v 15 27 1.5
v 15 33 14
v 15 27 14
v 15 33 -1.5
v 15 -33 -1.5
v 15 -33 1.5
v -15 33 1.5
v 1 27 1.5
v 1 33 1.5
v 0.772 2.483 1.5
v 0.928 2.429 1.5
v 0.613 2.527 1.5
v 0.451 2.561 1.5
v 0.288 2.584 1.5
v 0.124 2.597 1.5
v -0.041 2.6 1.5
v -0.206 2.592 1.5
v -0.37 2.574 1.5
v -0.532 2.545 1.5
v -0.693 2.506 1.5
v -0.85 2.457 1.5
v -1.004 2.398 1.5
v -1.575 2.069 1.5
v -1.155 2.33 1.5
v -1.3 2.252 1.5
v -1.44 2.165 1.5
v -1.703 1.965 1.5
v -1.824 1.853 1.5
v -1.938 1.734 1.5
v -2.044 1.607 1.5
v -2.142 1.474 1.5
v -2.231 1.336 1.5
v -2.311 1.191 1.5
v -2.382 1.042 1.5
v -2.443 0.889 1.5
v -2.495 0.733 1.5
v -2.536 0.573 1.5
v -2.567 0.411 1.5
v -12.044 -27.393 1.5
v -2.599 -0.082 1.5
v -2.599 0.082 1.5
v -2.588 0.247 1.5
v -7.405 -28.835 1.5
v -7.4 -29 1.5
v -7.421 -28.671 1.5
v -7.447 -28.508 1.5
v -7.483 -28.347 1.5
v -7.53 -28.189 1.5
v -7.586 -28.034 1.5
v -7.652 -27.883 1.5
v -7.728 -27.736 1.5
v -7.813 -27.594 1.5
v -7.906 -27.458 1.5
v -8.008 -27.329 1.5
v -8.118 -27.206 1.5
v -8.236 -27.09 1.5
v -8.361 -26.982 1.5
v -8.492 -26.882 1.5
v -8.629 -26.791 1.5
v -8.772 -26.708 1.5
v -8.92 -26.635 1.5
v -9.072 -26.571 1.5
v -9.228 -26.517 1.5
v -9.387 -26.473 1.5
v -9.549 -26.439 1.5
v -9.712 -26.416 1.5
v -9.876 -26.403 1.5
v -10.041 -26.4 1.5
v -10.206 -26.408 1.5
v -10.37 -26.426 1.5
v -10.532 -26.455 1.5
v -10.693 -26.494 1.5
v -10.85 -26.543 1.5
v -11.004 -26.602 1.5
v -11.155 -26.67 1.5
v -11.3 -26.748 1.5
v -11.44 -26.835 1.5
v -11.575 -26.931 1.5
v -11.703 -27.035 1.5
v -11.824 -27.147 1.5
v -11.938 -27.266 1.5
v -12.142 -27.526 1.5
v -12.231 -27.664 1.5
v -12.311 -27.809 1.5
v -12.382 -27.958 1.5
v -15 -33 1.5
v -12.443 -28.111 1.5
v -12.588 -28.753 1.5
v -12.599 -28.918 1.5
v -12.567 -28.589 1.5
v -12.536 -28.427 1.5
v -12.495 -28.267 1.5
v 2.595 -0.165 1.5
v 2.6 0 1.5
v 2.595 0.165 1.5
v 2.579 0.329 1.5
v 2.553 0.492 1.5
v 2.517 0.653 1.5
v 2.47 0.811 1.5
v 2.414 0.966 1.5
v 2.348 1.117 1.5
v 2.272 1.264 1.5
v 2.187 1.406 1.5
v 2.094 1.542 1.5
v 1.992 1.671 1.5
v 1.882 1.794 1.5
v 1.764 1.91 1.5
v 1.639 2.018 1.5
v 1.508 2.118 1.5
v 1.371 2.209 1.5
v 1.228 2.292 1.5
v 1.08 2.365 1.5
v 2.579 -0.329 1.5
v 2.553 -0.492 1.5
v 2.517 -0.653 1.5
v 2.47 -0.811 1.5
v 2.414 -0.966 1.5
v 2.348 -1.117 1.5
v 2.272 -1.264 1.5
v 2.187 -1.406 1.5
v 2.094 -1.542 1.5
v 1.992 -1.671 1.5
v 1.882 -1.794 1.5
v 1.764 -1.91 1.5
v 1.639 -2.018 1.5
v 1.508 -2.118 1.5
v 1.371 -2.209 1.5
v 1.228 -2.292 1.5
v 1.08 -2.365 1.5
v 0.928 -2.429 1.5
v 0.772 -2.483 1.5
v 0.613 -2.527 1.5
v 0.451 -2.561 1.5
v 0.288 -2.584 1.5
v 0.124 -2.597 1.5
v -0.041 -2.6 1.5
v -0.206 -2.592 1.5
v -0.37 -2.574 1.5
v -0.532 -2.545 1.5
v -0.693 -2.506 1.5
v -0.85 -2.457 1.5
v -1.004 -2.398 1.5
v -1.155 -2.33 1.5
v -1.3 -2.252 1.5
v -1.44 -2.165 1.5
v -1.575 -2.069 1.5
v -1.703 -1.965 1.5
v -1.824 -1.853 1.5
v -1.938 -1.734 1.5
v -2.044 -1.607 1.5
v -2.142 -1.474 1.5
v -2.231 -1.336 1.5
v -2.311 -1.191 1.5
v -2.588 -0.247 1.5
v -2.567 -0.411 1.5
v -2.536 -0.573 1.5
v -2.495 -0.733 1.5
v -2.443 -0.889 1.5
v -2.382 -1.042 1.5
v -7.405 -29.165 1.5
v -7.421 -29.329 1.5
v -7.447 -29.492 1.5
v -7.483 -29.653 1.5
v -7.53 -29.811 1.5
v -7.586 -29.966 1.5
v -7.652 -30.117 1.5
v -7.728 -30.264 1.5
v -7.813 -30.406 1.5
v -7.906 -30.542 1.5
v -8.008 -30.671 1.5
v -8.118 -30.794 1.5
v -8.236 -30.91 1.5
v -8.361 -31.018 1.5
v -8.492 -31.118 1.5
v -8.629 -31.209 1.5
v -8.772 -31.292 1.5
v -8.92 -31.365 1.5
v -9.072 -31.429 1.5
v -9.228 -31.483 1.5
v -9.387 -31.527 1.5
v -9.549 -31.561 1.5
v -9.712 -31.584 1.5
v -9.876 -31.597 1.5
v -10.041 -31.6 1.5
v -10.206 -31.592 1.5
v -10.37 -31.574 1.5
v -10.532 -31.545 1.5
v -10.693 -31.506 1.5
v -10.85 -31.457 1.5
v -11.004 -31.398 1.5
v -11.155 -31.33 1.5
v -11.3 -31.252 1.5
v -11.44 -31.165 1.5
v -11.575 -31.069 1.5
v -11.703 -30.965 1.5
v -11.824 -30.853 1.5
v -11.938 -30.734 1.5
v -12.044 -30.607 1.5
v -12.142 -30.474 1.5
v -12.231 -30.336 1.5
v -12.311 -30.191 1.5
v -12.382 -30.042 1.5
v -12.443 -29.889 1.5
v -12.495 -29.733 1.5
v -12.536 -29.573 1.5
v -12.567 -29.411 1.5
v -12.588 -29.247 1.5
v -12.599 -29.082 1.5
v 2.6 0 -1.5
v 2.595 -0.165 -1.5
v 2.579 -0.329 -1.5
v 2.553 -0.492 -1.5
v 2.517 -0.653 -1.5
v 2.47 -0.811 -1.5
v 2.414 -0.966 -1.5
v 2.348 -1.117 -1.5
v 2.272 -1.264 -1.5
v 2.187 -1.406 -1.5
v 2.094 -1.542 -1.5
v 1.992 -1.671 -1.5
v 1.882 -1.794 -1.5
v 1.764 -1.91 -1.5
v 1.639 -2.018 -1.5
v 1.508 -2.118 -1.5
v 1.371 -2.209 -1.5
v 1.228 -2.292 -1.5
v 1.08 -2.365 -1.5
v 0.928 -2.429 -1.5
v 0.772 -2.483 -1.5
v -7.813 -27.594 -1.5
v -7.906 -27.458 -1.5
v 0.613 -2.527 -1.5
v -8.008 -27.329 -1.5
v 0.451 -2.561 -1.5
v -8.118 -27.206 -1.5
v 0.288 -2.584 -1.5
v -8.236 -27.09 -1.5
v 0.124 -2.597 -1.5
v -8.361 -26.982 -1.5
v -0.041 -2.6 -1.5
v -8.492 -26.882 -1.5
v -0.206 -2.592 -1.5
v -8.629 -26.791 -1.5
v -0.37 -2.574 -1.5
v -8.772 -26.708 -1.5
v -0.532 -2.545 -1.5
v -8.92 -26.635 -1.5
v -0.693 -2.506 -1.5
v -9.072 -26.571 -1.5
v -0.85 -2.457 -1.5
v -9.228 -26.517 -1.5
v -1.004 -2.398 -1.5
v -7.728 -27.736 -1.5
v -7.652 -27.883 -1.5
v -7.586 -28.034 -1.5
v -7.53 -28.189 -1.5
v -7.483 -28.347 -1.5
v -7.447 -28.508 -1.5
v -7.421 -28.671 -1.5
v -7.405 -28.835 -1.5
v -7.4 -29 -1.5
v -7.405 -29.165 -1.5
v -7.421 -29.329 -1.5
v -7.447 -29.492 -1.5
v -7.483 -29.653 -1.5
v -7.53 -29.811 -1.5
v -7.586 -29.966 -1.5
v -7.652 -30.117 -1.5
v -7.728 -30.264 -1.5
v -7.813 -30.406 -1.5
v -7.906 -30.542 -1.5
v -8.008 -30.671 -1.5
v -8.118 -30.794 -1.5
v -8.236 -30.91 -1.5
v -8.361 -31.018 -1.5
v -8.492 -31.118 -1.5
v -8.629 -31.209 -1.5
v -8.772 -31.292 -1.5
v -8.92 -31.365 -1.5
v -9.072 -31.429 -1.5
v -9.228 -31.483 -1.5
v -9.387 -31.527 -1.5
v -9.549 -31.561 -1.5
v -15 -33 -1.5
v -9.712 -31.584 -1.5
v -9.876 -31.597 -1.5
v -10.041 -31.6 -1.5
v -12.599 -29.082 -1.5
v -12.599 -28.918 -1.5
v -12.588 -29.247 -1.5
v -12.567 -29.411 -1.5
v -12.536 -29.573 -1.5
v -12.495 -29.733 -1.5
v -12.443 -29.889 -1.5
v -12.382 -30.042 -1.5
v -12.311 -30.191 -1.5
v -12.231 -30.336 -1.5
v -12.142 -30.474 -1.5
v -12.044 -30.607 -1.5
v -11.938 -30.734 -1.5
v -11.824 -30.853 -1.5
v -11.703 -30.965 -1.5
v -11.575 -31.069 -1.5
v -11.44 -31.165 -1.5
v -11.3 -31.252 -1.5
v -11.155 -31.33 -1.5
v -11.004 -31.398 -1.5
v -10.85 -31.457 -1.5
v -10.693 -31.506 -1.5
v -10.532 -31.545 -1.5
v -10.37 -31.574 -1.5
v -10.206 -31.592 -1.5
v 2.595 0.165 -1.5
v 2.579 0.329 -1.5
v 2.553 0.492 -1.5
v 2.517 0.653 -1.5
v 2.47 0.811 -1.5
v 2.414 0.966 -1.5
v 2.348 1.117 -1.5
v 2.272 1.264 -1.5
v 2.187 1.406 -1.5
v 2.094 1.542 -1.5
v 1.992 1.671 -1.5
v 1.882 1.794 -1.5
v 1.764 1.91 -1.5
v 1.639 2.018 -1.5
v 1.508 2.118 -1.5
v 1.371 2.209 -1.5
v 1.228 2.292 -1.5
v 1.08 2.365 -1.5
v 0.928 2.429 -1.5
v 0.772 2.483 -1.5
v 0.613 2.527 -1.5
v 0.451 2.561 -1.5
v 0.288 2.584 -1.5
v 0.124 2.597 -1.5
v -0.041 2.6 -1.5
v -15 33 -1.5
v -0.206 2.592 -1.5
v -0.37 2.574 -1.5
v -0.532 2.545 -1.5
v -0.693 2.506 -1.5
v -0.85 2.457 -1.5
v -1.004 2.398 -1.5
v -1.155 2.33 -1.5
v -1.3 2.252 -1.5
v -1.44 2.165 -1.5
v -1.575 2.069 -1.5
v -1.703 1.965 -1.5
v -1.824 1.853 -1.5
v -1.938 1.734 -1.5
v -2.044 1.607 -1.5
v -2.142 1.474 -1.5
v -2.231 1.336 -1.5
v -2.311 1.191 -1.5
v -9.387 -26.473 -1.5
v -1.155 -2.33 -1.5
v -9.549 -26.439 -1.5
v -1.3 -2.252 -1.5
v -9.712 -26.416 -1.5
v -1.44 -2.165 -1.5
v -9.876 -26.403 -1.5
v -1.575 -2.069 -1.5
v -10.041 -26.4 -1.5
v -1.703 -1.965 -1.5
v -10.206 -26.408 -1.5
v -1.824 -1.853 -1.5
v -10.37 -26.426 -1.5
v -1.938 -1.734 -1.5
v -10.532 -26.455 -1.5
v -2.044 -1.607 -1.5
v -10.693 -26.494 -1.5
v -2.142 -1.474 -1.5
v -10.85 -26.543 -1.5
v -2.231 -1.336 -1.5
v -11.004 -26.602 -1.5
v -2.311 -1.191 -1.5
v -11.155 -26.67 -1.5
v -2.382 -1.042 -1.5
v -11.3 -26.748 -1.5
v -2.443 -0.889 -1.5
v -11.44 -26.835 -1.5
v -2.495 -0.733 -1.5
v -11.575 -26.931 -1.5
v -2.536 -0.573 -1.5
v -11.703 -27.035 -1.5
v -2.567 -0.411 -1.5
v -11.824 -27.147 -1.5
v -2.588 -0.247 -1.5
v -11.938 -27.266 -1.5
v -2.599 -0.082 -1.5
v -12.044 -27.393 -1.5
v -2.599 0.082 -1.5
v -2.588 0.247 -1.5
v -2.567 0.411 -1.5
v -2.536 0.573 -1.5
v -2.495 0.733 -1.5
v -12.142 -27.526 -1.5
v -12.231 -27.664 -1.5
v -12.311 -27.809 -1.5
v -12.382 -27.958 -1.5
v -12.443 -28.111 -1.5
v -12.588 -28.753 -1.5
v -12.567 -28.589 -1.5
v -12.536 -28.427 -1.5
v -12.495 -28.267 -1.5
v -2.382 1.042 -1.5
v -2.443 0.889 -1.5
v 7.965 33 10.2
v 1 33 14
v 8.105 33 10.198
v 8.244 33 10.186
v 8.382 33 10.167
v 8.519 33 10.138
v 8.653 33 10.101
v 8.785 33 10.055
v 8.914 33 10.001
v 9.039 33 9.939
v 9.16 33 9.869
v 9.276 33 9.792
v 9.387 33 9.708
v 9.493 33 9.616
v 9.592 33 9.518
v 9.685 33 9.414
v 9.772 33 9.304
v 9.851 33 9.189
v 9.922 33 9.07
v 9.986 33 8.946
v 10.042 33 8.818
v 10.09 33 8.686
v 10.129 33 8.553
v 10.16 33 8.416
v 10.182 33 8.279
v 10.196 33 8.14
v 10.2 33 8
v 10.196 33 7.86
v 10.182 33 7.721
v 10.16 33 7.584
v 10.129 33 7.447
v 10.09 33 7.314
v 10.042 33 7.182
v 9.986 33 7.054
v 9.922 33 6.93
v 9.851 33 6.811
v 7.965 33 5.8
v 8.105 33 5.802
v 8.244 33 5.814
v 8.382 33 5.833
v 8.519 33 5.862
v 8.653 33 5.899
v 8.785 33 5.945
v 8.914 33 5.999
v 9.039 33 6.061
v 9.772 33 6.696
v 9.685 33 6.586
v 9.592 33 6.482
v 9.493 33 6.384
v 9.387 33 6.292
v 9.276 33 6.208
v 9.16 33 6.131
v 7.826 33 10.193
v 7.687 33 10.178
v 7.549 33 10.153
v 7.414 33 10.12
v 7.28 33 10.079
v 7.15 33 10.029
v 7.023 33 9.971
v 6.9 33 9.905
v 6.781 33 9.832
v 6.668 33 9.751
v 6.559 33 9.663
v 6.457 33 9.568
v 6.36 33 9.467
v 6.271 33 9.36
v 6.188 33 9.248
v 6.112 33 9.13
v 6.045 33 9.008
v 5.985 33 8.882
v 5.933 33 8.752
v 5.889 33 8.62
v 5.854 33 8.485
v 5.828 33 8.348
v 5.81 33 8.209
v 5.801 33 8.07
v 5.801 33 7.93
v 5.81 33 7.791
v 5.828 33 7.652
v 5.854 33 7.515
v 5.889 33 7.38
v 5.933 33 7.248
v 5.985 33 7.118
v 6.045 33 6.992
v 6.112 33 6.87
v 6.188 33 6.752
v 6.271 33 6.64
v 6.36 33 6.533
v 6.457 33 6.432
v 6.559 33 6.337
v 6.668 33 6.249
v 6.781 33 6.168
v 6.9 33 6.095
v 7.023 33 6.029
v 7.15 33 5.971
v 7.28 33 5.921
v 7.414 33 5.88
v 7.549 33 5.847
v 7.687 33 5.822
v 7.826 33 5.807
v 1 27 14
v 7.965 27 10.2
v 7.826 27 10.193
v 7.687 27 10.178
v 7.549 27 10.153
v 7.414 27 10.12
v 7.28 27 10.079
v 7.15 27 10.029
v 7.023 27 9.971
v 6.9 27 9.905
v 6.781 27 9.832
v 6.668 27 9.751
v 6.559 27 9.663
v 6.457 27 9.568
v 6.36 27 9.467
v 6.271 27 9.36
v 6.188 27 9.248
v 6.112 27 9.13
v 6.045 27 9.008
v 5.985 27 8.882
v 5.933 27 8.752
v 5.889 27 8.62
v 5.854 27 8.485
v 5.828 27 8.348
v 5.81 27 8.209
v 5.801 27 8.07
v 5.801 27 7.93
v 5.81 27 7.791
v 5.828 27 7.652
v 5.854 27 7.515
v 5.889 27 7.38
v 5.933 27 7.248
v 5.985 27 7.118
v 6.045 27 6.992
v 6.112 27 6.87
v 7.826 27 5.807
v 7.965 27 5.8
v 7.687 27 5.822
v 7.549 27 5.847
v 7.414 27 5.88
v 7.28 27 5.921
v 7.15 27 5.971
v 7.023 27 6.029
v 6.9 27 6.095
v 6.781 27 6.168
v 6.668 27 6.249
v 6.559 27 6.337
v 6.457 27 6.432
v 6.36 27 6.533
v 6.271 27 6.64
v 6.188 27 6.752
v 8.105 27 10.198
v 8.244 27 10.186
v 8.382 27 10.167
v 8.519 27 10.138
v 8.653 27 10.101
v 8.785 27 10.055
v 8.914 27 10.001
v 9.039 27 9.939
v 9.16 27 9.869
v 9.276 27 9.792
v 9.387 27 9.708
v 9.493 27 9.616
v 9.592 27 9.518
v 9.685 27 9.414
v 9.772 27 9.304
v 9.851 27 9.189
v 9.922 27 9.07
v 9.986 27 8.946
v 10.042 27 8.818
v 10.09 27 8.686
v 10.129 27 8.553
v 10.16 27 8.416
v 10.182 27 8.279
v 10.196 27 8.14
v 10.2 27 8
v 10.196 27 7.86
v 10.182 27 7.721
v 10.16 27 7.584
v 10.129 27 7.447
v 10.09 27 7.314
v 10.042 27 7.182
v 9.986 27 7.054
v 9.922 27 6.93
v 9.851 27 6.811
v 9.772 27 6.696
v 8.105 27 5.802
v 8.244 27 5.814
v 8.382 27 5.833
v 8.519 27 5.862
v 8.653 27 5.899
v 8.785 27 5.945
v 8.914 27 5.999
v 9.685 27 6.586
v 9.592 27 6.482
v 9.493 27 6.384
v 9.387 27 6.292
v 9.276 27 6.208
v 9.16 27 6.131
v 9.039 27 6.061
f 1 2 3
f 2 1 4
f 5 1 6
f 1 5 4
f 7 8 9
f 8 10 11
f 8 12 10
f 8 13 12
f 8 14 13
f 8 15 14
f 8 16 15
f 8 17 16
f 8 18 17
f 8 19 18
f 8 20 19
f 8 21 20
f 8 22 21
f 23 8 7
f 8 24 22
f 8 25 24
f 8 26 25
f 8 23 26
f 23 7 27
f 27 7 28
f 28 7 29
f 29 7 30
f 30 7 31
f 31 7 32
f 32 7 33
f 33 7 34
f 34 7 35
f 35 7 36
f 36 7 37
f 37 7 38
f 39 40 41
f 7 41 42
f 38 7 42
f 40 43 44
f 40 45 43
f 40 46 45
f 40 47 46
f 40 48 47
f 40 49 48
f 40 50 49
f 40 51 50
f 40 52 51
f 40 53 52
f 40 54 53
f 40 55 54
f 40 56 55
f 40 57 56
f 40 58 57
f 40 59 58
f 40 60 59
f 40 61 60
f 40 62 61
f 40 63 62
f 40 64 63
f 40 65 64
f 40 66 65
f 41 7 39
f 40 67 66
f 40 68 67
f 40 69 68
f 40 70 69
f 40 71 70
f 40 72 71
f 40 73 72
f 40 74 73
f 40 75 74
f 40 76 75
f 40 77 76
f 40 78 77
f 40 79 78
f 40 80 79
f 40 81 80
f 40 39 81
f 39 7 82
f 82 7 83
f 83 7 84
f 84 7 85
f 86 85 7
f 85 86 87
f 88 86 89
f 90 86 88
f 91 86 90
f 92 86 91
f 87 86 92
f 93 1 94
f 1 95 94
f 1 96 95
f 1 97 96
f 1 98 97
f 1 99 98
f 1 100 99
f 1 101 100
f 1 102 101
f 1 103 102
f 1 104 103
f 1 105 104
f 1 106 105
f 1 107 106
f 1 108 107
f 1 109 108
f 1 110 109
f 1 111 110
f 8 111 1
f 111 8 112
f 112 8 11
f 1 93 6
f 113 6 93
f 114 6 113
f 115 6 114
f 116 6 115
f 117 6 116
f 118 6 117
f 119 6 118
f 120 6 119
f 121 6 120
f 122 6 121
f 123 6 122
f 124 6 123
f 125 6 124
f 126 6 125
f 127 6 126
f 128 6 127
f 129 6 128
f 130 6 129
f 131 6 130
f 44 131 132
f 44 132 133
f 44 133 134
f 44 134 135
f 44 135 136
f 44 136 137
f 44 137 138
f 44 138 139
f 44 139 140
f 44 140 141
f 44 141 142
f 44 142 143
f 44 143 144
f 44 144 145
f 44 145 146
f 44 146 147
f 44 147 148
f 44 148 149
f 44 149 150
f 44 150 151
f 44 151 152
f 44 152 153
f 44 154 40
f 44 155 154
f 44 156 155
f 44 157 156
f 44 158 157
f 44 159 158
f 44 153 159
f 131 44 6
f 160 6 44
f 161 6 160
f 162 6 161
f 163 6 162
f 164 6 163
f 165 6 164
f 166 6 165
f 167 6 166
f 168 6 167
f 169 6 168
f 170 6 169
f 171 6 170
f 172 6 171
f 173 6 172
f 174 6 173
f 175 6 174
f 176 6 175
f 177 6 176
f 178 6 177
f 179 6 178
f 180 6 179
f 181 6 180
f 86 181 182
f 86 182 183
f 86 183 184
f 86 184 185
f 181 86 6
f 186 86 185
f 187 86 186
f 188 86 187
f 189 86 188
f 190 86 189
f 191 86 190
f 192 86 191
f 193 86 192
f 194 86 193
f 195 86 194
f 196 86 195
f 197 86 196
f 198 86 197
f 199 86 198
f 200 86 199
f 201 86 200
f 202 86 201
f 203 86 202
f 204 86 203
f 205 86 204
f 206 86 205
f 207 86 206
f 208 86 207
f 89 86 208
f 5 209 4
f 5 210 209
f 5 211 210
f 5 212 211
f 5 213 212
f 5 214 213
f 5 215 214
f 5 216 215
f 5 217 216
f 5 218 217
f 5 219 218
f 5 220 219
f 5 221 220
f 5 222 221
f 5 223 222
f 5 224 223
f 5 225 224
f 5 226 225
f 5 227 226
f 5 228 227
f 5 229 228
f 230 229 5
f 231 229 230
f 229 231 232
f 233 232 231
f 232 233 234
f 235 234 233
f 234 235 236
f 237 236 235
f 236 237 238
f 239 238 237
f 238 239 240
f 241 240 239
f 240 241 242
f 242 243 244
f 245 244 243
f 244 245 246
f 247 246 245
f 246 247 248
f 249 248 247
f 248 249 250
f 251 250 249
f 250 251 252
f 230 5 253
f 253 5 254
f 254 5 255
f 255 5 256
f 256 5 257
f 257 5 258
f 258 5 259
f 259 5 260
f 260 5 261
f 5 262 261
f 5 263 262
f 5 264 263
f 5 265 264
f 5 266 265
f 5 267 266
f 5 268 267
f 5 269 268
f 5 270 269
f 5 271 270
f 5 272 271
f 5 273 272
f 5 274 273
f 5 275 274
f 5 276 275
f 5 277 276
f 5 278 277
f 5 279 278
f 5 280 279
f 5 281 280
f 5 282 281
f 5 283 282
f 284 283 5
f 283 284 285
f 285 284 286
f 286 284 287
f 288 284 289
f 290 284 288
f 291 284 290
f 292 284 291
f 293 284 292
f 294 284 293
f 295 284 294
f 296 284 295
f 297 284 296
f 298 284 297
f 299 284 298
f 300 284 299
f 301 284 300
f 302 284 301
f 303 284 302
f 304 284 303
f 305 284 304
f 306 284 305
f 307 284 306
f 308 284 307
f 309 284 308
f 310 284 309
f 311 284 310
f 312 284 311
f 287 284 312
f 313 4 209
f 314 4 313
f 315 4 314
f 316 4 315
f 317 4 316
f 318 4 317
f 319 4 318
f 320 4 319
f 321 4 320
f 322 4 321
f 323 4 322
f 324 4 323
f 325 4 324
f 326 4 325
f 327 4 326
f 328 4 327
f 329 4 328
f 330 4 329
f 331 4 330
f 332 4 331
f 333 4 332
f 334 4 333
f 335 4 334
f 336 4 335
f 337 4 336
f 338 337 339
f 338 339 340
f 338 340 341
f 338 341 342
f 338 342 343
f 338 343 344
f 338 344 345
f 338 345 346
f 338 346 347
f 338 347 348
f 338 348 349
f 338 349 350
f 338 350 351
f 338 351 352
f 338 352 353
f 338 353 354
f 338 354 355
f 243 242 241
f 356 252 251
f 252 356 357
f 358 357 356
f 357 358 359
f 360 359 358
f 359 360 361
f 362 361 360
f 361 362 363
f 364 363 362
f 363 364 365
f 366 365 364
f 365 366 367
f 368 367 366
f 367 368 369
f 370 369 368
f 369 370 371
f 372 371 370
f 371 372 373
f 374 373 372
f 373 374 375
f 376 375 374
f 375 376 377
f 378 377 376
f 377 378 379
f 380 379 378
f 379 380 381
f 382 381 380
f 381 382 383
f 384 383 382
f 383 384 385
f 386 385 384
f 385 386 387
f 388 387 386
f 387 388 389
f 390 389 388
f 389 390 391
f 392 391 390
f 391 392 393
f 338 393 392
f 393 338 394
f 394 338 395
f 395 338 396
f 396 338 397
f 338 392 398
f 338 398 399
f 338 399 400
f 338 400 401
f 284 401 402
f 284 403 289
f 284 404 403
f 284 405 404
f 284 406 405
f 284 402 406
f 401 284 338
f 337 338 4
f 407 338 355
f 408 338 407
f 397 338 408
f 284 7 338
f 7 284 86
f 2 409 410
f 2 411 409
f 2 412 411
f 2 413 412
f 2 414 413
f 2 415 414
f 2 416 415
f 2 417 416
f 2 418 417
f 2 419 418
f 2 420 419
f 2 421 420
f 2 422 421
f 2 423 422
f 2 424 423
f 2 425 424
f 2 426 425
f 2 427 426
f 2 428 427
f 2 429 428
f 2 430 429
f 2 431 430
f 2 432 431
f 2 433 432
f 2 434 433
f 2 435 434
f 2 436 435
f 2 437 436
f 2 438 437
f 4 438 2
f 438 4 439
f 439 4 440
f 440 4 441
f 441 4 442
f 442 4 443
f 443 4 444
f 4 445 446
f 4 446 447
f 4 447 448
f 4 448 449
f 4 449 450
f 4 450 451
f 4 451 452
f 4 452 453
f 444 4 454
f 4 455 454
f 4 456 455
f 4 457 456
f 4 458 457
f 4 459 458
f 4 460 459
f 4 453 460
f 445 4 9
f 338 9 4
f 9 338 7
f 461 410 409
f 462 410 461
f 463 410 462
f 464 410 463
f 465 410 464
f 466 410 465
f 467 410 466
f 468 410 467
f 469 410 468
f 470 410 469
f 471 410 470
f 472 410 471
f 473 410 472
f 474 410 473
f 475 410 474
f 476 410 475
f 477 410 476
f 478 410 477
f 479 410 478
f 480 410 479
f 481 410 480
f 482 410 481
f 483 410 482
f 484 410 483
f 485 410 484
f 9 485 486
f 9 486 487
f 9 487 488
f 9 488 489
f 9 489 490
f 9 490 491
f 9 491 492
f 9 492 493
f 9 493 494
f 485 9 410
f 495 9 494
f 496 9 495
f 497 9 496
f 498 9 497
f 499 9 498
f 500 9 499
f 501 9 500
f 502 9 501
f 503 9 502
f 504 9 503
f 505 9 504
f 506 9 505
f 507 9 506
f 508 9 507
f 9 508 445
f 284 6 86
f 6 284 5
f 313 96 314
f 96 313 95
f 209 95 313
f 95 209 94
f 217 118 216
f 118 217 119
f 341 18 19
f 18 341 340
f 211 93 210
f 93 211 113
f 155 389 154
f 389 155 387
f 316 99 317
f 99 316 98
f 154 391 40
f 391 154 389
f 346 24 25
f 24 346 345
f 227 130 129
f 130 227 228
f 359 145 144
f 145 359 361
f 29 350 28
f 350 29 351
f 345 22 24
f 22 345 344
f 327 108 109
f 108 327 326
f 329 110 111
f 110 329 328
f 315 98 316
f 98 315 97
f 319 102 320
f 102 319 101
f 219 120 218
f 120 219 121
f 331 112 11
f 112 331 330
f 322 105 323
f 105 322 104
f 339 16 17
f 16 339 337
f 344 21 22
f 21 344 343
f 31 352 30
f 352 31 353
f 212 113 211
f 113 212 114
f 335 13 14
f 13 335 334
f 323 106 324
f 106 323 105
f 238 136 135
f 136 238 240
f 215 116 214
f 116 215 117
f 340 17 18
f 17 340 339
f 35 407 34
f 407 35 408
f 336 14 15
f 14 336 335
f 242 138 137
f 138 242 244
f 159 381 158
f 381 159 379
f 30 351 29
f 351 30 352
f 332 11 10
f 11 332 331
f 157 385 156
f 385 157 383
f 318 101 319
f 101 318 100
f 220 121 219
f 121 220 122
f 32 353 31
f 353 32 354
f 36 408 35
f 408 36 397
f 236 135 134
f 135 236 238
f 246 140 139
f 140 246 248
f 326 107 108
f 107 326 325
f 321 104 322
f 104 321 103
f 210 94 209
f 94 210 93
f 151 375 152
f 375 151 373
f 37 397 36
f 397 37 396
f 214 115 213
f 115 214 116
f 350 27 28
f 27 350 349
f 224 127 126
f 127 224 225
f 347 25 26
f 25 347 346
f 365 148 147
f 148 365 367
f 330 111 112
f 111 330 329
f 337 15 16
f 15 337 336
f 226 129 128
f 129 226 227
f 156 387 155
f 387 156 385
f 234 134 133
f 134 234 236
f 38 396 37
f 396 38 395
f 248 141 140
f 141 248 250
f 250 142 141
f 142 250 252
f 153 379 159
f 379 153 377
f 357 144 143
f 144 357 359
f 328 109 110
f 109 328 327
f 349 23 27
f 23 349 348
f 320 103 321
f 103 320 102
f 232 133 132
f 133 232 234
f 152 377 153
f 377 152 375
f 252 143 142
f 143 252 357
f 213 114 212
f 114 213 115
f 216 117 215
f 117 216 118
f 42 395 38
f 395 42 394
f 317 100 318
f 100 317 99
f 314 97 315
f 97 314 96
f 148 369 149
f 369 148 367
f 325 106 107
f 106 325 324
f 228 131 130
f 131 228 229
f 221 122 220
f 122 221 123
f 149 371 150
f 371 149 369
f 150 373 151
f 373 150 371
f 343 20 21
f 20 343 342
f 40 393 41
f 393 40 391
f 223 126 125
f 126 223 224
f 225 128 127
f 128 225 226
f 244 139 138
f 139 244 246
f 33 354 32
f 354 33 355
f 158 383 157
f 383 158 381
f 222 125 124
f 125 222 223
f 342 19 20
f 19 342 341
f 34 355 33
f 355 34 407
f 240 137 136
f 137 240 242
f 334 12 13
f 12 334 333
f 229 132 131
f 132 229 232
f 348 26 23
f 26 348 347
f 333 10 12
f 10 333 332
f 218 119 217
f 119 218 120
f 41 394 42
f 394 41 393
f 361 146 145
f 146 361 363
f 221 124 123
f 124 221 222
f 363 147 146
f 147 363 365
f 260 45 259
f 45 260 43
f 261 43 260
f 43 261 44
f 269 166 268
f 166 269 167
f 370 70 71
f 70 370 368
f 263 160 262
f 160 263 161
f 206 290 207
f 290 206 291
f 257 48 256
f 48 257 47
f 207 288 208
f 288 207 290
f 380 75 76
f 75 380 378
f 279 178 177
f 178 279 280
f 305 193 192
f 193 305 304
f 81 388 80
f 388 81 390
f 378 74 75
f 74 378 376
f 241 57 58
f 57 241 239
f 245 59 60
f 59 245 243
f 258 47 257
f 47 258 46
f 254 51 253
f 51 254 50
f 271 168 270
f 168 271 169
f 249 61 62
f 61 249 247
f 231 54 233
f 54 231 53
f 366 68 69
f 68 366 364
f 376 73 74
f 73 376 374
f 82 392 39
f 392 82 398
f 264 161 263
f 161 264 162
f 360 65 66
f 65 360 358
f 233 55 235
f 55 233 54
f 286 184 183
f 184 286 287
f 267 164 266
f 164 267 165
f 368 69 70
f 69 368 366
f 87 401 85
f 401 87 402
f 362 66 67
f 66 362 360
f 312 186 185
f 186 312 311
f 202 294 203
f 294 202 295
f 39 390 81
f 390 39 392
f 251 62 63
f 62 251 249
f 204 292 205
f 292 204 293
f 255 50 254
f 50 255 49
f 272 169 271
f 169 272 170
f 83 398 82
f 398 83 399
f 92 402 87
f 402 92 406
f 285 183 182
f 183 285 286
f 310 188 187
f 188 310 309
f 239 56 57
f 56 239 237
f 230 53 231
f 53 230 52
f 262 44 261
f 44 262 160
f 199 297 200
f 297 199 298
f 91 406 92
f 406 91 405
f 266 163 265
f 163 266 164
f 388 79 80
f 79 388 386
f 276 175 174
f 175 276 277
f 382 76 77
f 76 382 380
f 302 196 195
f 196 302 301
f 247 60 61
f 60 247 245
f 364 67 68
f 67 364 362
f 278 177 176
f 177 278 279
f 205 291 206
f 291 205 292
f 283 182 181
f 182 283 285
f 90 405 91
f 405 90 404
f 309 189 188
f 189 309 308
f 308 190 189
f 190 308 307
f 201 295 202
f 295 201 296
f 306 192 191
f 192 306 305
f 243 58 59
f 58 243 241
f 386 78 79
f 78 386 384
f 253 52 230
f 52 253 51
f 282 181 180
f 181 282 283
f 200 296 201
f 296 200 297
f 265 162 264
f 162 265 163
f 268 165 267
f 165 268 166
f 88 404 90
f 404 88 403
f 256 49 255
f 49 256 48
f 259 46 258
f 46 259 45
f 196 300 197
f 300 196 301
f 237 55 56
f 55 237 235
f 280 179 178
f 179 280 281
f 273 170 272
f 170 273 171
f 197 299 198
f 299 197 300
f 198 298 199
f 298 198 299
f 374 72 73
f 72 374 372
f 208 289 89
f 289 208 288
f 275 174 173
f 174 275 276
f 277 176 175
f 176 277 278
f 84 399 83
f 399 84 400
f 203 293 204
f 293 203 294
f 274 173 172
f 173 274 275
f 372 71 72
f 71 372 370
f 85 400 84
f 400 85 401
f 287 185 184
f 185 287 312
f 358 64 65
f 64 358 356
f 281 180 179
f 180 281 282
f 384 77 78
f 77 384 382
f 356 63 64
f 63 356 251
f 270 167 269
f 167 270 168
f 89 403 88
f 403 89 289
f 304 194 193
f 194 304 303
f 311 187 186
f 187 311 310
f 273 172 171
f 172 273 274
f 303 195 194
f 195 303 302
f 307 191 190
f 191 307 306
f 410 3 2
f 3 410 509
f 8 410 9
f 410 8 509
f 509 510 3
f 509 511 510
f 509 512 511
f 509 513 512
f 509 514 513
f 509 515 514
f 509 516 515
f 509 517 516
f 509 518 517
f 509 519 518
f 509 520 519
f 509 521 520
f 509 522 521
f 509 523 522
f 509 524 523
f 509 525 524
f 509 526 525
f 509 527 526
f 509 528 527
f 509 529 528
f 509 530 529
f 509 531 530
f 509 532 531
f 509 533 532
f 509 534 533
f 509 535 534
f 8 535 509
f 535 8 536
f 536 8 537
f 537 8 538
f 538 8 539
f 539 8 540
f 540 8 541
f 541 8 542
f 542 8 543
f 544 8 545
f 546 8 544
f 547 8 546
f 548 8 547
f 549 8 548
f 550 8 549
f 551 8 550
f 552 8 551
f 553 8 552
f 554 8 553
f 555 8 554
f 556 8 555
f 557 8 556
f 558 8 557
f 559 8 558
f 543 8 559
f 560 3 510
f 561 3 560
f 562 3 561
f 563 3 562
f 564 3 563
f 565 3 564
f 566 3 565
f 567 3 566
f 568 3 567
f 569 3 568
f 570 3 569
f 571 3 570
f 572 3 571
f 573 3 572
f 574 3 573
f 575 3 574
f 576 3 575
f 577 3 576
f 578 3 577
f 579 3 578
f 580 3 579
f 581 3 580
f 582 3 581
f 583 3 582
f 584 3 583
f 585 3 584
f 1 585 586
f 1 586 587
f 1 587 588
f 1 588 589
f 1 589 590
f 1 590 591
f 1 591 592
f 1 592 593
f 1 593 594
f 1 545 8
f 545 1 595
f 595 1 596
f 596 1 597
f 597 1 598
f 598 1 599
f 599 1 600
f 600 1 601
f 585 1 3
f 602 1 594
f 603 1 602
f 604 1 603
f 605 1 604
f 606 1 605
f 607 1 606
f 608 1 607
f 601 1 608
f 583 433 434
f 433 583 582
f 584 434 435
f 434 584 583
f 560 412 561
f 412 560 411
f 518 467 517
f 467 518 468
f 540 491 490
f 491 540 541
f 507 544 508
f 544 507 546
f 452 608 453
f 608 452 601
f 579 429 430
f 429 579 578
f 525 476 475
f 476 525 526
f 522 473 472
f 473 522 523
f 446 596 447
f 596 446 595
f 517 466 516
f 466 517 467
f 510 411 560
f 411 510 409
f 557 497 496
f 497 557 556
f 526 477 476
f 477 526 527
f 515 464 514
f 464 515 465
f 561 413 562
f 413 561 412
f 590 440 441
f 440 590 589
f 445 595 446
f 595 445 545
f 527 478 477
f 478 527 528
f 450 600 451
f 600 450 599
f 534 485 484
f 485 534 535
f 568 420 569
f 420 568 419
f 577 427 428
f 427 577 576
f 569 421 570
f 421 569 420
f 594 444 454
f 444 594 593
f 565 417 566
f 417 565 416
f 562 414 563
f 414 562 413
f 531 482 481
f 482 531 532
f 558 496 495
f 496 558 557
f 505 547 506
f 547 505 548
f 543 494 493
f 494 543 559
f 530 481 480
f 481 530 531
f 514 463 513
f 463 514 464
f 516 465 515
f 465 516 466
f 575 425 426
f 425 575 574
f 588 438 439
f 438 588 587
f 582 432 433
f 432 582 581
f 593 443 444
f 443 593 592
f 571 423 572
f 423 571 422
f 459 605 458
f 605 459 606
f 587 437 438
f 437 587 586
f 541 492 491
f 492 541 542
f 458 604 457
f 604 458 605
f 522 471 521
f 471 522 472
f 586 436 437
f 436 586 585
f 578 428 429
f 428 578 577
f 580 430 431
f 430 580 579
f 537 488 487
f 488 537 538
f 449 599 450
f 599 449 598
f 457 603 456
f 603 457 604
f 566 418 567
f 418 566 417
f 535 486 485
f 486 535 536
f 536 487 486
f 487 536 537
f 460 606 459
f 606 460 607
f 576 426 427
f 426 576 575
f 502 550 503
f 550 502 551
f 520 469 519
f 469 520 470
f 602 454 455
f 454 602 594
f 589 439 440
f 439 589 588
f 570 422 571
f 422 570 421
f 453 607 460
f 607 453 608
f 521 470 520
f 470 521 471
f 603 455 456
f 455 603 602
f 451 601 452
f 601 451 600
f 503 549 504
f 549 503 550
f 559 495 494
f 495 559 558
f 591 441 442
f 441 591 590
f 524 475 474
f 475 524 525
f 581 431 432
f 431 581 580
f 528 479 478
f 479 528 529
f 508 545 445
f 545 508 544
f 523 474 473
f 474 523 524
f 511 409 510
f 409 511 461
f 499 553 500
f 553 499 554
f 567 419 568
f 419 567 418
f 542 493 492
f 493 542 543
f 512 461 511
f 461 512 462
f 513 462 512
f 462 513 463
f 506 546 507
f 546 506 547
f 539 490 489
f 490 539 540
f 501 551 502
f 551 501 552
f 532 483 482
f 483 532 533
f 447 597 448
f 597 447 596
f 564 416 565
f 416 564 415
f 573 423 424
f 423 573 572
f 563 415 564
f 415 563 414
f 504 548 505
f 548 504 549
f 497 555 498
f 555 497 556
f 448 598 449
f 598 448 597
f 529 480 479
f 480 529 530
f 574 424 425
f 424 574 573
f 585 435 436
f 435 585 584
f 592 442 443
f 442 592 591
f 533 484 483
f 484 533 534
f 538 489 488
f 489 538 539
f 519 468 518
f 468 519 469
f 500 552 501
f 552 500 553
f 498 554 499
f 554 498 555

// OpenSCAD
$fn=99; 

difference() {
    cube([30,66,3], center=true); 
    translate([0,0,0]) cylinder(r=2.6, h=4, center=true); 
    translate([-10,-29,0]) cylinder(r=2.6, h=4, center=true); 
}

difference() {
    translate([1,27,0]) cube([14,6,14]); 
    translate([8,0,8]) rotate([90,0,0]) cylinder(r=2.2, h=100, center=true); 
}
